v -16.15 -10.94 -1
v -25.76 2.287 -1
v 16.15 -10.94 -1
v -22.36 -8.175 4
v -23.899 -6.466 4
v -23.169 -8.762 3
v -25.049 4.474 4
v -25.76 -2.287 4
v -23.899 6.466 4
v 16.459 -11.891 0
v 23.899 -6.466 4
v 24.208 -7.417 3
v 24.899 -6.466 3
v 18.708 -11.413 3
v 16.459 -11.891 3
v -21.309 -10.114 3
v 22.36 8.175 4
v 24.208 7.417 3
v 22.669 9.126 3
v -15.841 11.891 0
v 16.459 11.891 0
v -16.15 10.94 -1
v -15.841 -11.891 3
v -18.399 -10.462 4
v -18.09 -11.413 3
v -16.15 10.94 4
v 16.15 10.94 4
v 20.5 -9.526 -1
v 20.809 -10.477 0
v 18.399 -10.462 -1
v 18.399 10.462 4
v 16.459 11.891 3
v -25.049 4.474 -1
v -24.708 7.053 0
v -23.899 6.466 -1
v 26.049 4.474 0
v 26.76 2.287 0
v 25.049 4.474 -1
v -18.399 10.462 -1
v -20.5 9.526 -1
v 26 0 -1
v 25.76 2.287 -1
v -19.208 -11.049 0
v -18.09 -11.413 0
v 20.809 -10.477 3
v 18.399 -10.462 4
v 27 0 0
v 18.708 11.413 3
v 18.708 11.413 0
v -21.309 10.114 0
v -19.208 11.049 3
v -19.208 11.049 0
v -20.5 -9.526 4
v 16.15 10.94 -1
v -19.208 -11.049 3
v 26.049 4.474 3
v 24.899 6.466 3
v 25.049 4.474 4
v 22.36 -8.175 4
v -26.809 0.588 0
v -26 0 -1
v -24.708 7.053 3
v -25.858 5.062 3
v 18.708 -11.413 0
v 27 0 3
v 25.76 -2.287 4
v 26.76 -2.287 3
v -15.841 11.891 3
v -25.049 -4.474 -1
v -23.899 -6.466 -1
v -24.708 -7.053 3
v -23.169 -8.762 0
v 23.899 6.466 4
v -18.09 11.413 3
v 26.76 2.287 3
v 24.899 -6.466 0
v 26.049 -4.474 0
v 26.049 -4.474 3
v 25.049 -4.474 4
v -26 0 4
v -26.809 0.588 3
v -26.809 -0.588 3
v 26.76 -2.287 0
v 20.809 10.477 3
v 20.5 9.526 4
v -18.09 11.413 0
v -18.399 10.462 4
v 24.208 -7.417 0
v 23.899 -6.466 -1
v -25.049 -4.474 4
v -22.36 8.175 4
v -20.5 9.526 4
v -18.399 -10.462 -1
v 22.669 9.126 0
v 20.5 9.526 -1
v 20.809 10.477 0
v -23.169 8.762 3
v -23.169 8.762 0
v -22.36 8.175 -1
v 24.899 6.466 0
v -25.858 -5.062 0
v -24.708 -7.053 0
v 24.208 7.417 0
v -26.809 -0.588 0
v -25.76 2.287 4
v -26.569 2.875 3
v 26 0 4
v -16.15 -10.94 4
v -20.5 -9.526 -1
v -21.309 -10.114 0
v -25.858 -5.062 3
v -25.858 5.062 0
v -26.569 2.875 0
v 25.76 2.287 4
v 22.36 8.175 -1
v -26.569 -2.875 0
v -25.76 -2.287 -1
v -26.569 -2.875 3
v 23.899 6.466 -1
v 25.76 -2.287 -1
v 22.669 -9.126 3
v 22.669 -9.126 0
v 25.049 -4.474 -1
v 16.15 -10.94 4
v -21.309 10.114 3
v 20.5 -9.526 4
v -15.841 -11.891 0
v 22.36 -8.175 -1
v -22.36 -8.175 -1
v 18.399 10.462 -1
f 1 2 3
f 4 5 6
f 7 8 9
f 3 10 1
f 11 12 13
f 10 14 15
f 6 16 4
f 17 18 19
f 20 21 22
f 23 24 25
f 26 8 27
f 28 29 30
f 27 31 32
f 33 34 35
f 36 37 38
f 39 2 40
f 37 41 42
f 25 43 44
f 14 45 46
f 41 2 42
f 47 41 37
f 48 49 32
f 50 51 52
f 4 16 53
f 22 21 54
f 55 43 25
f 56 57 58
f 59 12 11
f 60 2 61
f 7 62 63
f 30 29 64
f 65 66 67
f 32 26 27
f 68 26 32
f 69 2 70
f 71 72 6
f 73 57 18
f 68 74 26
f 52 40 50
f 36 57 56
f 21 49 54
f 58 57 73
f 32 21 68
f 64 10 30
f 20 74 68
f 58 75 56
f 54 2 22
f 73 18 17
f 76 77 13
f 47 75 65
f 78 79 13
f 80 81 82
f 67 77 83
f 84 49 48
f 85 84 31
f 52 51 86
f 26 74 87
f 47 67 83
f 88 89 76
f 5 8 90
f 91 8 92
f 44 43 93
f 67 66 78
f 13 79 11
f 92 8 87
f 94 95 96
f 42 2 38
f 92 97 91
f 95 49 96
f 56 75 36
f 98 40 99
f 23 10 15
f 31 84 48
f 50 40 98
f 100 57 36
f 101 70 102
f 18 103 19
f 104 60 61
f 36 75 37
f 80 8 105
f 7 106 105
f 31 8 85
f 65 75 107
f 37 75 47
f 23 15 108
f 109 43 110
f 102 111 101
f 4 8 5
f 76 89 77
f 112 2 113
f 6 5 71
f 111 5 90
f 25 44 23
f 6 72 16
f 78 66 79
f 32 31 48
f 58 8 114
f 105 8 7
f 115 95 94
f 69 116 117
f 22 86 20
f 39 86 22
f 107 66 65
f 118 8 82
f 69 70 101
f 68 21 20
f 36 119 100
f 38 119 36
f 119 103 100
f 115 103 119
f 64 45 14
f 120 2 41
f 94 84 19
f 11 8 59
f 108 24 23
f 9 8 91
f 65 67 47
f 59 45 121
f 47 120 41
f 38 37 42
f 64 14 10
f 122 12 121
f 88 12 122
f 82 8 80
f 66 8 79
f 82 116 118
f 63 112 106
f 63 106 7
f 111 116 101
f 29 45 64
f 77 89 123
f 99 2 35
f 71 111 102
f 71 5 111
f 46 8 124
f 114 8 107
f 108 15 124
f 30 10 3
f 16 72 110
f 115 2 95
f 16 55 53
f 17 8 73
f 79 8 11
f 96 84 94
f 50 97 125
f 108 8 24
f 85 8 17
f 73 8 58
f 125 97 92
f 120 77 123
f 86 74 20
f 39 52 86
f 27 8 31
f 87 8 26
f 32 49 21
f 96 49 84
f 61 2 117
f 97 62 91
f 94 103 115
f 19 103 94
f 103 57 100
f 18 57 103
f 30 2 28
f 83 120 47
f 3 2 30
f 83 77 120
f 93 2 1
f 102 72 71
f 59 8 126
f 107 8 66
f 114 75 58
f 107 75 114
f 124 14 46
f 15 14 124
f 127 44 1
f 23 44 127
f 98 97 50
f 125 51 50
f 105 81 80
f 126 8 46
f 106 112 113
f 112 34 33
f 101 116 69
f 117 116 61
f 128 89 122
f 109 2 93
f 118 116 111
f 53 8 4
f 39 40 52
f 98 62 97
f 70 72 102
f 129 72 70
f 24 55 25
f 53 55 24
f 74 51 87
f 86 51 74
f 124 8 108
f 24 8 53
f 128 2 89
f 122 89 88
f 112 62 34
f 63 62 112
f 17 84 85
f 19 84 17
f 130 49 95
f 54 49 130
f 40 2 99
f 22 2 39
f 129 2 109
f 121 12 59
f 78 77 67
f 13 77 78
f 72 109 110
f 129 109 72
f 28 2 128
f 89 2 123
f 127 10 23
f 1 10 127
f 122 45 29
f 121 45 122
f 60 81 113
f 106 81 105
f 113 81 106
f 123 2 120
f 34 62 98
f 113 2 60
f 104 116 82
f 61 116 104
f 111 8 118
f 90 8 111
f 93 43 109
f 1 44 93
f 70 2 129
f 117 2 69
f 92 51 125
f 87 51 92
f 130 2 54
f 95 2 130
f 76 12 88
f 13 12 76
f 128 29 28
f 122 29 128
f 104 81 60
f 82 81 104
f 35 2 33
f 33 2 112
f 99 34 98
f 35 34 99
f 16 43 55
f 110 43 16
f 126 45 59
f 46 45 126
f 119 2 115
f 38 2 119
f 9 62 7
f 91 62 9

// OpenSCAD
// corpus 3376352: a stadium plate chamfered by a double cone — the plate is the hull of two upright
// cylinders, each summed with the cone as a coaxial solid of revolution, and their hull is exact.
minkowski() {
  linear_extrude(3) hull() {
    translate([-15, 0]) circle(11);
    translate([15, 0]) circle(11);
  }
  union() {
    cylinder(r1 = 1, r2 = 0, h = 1);
    mirror([0, 0, 1]) cylinder(r1 = 1, r2 = 0, h = 1);
  }
}
